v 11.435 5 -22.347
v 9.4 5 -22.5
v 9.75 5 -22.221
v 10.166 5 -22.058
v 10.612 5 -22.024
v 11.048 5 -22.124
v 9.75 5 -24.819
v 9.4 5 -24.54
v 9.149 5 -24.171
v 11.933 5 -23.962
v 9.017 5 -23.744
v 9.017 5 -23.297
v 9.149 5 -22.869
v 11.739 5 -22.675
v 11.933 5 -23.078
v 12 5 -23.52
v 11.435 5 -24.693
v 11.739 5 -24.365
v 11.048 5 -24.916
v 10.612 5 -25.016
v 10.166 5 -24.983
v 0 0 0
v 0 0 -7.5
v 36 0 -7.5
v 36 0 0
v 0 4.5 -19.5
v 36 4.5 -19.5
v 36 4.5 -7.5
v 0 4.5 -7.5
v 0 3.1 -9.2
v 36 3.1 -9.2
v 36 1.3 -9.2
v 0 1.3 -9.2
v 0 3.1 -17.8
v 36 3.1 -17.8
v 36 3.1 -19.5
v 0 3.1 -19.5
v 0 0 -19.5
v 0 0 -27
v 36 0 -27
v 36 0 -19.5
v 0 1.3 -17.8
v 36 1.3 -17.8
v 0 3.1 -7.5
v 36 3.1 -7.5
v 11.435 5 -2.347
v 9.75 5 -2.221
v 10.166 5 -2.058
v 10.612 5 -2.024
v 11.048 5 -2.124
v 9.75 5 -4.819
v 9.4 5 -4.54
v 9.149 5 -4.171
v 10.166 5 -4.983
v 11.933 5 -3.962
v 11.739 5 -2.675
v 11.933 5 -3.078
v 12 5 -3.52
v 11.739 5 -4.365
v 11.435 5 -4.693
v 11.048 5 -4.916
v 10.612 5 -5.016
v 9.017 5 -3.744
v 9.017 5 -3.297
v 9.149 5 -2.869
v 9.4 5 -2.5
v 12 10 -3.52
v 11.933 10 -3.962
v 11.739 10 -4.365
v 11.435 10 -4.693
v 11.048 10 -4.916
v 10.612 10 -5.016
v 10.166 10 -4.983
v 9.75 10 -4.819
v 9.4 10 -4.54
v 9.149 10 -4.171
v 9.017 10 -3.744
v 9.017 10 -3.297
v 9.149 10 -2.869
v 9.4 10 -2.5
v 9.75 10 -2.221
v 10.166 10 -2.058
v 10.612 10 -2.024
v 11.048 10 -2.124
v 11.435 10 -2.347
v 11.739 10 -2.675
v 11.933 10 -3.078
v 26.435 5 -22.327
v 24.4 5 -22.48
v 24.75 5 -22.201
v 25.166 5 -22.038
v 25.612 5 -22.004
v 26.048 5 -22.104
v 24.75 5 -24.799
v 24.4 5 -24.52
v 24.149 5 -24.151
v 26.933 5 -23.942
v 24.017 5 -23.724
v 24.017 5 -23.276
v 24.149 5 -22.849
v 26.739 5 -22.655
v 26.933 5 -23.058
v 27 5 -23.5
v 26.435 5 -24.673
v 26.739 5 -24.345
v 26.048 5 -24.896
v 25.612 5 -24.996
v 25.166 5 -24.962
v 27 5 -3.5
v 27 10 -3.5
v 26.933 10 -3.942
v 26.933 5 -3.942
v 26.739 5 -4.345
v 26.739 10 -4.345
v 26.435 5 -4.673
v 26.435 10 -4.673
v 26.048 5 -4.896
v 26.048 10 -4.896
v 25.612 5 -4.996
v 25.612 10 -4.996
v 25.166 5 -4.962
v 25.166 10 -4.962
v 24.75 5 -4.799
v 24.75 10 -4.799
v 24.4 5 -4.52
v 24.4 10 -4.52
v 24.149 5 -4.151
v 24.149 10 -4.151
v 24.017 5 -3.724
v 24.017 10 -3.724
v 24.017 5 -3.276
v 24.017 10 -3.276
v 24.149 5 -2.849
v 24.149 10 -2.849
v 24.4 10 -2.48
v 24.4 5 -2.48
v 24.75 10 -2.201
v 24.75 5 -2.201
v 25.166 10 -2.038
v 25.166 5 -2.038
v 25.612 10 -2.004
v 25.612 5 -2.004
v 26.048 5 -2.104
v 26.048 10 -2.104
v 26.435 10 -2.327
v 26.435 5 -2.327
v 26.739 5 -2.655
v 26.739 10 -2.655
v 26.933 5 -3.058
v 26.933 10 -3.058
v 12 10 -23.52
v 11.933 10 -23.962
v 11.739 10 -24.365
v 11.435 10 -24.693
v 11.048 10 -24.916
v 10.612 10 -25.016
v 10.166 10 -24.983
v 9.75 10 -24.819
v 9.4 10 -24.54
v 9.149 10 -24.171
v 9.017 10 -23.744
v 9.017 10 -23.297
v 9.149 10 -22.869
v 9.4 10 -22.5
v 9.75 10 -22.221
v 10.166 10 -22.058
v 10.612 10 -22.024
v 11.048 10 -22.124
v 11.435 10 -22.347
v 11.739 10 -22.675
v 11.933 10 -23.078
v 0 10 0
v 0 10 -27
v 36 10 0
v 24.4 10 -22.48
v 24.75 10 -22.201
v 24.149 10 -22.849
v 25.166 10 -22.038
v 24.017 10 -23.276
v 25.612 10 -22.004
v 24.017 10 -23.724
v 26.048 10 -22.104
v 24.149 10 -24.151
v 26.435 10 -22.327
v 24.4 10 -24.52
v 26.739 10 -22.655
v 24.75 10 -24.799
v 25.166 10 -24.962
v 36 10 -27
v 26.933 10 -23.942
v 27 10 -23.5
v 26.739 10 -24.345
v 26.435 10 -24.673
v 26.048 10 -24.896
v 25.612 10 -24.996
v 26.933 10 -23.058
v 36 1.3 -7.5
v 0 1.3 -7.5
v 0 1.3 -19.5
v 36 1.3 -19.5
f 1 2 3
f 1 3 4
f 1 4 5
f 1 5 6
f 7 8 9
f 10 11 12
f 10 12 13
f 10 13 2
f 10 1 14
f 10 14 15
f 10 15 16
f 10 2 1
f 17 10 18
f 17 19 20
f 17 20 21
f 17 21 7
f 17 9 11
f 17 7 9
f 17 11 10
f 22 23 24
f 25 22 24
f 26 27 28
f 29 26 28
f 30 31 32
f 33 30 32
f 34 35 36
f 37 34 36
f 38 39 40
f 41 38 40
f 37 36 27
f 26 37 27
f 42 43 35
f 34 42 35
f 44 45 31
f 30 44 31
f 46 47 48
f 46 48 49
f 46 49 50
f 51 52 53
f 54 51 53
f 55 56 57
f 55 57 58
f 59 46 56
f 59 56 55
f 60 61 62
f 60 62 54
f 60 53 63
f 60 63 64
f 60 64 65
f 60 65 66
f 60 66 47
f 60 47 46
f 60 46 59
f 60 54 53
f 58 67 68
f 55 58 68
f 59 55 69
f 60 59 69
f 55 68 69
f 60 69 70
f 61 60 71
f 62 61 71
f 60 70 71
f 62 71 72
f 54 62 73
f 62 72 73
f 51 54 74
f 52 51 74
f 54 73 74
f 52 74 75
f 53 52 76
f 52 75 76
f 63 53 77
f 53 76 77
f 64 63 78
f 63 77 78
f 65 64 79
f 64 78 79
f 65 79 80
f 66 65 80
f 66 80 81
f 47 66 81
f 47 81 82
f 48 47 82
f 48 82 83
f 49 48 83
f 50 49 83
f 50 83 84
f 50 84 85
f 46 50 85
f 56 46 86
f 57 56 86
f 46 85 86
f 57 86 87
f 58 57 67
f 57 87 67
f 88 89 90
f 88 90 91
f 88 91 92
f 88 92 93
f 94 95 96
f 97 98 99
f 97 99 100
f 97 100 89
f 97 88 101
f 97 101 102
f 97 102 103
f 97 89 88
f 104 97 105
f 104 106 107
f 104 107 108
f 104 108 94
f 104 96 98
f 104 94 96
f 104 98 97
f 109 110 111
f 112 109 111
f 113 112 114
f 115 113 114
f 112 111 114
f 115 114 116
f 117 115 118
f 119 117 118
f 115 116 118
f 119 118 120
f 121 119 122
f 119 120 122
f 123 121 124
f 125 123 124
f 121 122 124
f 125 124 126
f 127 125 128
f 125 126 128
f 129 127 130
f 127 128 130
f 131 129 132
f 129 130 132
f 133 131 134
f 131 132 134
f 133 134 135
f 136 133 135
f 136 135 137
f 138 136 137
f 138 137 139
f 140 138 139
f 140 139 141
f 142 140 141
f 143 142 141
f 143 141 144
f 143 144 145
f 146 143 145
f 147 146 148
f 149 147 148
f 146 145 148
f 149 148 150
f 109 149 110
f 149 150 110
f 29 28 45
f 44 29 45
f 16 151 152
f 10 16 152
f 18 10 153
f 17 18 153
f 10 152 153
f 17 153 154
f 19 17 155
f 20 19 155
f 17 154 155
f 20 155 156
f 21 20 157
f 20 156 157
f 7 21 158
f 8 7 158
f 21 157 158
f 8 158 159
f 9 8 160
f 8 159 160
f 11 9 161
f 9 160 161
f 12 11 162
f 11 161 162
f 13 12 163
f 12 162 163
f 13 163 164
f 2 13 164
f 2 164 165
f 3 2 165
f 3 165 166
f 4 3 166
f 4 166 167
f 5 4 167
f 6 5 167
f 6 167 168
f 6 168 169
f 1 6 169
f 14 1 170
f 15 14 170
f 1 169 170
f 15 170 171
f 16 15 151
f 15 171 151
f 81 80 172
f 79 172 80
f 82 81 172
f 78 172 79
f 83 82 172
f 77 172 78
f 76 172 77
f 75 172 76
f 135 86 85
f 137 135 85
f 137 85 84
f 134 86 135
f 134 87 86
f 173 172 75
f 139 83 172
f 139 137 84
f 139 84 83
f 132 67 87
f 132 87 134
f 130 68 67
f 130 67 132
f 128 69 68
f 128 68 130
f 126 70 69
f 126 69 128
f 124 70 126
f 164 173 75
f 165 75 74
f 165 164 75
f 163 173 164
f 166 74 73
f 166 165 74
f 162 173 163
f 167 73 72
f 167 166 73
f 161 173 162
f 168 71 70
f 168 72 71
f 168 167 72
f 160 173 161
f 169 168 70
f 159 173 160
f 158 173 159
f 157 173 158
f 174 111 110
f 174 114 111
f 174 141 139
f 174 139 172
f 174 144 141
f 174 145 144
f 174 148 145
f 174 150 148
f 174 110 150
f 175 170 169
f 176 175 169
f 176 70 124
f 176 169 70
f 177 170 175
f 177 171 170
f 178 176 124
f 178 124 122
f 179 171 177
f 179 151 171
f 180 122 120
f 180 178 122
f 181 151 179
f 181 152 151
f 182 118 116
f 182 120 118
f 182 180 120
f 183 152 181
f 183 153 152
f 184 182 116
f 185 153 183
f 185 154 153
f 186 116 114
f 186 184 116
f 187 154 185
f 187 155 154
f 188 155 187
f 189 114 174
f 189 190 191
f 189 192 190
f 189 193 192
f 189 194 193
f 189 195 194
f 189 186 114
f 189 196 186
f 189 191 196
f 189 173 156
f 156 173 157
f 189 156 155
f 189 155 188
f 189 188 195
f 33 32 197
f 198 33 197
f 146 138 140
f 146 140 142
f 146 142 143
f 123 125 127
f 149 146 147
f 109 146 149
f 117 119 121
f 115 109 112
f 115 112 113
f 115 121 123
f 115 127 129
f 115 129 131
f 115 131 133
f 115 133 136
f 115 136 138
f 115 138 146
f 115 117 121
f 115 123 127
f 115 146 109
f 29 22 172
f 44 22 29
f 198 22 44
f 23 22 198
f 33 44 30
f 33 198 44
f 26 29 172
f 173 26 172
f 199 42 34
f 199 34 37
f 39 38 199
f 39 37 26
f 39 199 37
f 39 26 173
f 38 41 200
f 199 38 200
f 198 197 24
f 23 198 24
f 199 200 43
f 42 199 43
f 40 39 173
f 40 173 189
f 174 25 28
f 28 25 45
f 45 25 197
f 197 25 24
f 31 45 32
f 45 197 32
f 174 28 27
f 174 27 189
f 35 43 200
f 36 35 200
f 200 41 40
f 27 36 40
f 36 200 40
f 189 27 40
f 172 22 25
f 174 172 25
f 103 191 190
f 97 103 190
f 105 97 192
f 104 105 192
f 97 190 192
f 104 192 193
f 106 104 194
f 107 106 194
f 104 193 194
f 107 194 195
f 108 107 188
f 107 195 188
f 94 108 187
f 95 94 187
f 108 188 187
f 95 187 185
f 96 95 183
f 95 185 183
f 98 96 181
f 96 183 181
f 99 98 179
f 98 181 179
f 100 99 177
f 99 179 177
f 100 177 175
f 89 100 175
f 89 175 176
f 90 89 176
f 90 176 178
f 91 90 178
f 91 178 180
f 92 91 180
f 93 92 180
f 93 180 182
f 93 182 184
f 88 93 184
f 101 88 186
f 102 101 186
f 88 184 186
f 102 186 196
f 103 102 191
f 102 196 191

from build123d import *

# Parameters (mm, degrees)
CROQUIS1_W              = 36
CROQUIS1_H              = 27
SALIENTE_EXTRUIR1_DEPTH = 10
CROQUIS2_R              = 1.5
CORTAR_EXTRUIR1_DEPTH   = 5
CORTAR_EXTRUIR2_DEPTH   = 36


with BuildPart() as part:
    # Croquis1 → Saliente-Extruir1 (new body)
    with BuildSketch(Plane(origin=(0, 0, 0), x_dir=(1, 0, 0), z_dir=(0, 1, 0))):
        with Locations((18, 13.5)):
            Rectangle(CROQUIS1_W, CROQUIS1_H)
    extrude(amount=SALIENTE_EXTRUIR1_DEPTH)

    # Croquis2 → Cortar-Extruir1 (cut)
    with BuildSketch(Plane(origin=(0, 10, 0), x_dir=(1, 0, 0), z_dir=(0, 1, 0))):
        with Locations((10.5, 23.52014925)):
            Circle(CROQUIS2_R)
        with Locations((25.499986467, 23.5)):
            Circle(CROQUIS2_R)
        with Locations((10.5, 3.52014925)):
            Circle(CROQUIS2_R)
        with Locations((25.499986467, 3.5)):
            Circle(CROQUIS2_R)
    extrude(amount=-CORTAR_EXTRUIR1_DEPTH, mode=Mode.SUBTRACT)

    # Croquis3 → Cortar-Extruir2 (cut)
    with BuildSketch(Plane(origin=(36, 0, 0), x_dir=(0, 0, -1), z_dir=(1, 0, 0))):
        Polygon((7.5, 0), (19.5, 0), (19.5, 1.3), (17.8, 1.3), (17.8, 3.1), (19.5, 3.1), (19.5, 4.5), (7.5, 4.5), (7.5, 3.1), (9.2, 3.1), (9.2, 1.3), (7.5, 1.3), align=None)
    extrude(amount=-CORTAR_EXTRUIR2_DEPTH, mode=Mode.SUBTRACT)


solid = part.part
